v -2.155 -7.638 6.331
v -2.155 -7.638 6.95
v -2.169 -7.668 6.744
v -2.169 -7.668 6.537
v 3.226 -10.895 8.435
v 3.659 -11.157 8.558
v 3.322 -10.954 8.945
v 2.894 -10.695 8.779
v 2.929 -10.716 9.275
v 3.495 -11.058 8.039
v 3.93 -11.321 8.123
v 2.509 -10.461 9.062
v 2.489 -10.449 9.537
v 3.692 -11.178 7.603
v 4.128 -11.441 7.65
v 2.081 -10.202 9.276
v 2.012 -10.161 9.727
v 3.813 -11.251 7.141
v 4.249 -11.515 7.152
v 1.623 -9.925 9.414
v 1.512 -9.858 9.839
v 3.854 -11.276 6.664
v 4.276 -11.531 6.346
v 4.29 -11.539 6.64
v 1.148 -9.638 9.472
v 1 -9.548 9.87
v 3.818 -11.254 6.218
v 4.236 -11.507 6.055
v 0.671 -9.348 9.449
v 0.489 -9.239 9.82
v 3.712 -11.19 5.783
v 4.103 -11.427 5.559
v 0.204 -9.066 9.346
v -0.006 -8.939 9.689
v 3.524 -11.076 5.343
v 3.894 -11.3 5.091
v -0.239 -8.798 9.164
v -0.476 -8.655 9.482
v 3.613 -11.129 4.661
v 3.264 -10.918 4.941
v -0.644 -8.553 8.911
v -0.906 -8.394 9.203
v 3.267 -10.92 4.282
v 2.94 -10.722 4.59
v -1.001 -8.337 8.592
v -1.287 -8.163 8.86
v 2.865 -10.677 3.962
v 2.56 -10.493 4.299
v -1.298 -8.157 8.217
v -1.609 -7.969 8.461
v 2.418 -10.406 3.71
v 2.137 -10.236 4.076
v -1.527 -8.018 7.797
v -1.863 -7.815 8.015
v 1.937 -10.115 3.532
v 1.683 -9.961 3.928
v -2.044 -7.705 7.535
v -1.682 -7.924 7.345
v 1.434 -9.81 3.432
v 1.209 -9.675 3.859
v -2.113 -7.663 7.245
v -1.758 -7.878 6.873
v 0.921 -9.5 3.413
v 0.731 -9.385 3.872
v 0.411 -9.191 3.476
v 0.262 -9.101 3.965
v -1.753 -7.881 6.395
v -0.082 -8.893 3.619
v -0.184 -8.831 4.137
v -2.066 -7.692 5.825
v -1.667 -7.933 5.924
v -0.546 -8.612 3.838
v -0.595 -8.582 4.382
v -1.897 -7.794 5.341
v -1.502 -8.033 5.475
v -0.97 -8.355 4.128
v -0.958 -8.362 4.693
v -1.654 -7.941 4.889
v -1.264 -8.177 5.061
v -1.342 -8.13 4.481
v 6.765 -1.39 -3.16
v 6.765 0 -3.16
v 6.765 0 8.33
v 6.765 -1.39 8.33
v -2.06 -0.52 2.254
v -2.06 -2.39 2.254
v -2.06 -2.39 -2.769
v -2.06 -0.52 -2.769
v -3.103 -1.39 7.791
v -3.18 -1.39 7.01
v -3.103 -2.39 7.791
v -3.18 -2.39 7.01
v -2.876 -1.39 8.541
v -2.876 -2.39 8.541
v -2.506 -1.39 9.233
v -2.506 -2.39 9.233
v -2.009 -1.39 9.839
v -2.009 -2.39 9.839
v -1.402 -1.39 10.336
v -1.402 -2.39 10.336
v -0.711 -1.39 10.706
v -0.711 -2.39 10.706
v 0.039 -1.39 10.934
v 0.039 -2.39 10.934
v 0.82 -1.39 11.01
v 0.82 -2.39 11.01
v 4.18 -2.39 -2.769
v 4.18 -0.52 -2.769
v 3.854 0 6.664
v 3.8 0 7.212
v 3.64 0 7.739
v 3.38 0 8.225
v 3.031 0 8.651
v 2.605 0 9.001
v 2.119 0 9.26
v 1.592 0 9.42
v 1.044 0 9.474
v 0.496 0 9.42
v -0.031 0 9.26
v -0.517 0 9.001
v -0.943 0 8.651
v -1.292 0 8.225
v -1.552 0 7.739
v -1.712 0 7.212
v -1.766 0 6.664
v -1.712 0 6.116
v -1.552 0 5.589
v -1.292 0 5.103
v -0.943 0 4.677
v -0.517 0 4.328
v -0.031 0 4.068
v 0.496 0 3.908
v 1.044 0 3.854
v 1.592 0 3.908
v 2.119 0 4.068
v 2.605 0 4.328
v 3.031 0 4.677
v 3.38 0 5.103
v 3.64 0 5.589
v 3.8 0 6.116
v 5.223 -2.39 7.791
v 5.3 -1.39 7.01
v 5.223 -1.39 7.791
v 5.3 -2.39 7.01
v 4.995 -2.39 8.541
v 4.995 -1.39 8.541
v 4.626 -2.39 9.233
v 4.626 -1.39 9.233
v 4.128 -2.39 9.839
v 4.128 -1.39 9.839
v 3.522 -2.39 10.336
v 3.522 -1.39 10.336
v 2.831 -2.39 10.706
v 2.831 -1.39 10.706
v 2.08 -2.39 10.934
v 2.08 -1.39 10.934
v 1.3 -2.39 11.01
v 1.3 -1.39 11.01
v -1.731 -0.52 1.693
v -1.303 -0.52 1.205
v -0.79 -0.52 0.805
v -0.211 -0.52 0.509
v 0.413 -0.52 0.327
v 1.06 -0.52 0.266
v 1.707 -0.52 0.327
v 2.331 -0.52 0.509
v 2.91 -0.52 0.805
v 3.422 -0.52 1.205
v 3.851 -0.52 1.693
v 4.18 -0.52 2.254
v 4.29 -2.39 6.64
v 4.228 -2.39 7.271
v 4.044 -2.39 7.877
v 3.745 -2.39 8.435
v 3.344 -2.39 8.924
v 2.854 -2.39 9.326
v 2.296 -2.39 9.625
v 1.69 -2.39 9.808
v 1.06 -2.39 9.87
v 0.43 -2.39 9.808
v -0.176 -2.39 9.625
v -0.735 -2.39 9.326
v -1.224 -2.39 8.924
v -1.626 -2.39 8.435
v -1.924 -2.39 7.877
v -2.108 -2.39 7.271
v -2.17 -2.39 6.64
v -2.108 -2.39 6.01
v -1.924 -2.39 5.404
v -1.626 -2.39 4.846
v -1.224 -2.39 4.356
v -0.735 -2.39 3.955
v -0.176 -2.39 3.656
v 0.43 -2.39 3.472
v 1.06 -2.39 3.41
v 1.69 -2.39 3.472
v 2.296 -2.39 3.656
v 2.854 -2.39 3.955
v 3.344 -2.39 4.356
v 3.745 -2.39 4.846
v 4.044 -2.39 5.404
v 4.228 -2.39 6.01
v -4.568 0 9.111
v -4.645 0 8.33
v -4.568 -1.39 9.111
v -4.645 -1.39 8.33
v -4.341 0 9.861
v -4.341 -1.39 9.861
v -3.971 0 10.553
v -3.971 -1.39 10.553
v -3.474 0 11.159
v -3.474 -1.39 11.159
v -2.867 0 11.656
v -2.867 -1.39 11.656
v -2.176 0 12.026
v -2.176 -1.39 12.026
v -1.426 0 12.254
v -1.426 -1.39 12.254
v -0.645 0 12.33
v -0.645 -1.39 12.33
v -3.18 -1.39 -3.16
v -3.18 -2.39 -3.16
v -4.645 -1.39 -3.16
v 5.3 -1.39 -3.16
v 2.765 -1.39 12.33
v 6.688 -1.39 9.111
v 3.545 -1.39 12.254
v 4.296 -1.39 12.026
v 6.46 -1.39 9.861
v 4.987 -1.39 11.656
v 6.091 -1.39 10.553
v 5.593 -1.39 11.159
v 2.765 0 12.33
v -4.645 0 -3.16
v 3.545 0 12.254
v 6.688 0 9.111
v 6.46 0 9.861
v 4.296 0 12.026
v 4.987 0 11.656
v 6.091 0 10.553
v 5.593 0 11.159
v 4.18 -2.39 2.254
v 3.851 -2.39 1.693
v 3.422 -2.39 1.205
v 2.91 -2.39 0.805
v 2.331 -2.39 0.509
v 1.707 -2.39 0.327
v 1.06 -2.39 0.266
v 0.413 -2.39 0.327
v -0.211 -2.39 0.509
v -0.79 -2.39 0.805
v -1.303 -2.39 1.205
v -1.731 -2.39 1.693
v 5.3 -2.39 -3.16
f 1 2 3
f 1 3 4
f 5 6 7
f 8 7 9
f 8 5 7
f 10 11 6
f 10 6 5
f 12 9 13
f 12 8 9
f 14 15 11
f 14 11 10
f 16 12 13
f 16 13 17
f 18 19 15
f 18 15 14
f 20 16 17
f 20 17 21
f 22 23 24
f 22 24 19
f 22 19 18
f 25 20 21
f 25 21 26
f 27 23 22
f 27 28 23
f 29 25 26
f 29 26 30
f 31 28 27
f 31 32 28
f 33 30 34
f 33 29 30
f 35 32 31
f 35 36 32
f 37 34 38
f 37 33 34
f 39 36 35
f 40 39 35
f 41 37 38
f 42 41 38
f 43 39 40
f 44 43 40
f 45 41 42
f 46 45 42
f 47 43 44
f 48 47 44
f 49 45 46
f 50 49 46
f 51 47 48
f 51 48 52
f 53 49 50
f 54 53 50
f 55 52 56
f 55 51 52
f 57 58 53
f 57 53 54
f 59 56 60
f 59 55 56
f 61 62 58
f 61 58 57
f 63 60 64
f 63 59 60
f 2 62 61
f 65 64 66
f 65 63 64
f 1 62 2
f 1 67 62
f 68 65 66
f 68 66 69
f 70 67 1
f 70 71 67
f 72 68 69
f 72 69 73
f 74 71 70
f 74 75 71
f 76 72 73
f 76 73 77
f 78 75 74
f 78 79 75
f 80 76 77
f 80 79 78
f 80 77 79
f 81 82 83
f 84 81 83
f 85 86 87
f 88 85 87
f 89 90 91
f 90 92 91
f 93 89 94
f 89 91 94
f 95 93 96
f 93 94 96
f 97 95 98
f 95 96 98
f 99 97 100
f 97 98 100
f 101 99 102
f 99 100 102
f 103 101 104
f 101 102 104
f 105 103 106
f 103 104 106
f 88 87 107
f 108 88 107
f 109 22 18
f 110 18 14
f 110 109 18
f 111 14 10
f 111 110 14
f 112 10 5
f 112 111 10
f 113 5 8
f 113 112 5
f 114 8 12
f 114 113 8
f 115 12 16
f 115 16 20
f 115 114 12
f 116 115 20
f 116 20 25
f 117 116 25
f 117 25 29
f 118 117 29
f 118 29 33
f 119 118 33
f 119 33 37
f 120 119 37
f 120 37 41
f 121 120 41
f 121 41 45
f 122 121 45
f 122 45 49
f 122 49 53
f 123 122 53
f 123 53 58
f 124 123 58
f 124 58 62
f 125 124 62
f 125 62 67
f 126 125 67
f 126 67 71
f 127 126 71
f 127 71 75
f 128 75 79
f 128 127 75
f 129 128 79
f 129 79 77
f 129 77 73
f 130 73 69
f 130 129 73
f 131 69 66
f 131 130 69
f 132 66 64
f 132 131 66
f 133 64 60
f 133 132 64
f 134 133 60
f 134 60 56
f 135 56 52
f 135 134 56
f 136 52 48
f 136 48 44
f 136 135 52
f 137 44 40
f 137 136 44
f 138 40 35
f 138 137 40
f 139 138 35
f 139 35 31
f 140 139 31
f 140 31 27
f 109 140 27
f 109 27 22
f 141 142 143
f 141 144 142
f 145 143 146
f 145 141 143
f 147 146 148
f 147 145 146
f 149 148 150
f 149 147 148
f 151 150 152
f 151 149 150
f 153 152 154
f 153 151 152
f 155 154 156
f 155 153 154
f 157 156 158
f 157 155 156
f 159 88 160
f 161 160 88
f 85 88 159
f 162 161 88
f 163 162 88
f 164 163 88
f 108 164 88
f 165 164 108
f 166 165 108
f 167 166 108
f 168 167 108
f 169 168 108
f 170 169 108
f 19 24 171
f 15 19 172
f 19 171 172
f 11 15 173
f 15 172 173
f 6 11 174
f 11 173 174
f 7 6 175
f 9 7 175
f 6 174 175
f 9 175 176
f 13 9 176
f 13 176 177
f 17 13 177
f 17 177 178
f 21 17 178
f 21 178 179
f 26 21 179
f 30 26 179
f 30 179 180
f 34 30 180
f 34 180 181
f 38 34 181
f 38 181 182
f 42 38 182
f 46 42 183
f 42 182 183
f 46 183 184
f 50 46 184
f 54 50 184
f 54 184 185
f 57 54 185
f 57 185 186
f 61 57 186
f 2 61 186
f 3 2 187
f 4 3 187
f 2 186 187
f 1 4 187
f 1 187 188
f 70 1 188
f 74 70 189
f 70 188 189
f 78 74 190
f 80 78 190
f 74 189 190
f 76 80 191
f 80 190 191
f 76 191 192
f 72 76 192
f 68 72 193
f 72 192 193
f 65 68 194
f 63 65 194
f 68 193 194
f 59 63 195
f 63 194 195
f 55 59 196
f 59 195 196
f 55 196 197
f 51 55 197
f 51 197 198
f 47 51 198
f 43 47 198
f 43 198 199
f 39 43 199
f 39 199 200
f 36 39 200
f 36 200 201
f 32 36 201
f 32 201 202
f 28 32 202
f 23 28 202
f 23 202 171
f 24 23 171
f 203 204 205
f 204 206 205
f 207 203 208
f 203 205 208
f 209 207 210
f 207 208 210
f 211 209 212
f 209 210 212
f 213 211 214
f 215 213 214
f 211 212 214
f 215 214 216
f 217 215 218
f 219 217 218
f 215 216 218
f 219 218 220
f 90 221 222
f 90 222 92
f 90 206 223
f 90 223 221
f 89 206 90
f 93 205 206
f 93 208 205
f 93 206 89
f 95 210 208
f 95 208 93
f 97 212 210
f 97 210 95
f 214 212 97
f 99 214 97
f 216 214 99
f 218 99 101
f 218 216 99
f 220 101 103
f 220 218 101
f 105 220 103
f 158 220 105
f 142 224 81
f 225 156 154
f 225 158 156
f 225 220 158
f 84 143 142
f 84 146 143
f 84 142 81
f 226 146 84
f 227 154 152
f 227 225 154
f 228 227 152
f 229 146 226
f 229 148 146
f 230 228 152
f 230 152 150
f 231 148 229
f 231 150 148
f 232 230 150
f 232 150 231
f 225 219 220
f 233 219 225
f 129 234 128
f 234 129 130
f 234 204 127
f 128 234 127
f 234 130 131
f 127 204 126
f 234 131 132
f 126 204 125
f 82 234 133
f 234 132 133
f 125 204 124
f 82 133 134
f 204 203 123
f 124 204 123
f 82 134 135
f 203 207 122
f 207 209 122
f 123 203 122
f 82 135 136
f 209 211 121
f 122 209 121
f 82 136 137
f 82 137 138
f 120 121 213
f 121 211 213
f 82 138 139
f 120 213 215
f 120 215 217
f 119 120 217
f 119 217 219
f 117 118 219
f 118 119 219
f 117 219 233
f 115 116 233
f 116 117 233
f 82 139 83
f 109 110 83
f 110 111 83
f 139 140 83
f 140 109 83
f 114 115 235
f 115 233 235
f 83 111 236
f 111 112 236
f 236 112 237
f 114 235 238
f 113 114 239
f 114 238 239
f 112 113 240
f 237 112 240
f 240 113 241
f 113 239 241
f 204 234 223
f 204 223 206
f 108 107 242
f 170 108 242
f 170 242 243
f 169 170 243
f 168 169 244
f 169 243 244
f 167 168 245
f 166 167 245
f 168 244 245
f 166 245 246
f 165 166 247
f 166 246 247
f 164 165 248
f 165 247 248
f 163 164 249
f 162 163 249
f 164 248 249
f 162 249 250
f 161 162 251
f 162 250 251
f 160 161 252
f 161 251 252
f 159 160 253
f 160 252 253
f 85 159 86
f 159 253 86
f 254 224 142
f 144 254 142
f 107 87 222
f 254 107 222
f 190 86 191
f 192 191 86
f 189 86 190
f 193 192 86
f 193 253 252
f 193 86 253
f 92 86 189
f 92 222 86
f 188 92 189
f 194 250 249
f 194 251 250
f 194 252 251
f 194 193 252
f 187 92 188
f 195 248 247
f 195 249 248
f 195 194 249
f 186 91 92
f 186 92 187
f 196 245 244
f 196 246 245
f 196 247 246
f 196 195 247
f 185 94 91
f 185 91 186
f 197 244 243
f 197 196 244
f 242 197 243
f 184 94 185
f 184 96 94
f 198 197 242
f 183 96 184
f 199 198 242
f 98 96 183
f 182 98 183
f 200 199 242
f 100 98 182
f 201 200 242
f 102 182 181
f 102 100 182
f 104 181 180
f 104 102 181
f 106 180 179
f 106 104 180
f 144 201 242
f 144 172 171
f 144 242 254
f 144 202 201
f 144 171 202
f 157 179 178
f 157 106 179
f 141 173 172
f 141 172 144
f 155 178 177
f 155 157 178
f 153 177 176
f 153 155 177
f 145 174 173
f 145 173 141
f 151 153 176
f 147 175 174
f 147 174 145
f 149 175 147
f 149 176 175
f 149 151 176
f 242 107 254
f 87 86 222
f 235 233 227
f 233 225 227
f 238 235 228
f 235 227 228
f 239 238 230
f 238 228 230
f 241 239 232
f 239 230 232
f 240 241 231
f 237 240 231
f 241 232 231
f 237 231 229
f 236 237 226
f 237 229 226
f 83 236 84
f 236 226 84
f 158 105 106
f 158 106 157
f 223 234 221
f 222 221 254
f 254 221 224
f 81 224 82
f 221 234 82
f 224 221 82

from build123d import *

# Parameters (mm, degrees)
F0_W      = 11.41
F0_H      = 15.49
F1_DEPTH  = 1.39
F2_W      = 8.48
F2_H      = 14.17
F3_DEPTH  = 1
F4_R      = 3.23
F5_DEPTH  = 9.16
F6_R      = 4
F7_R      = 2.809954
F8_DEPTH  = 11.551
F10_DEPTH = 25
F12_DEPTH = 1.87


with BuildPart() as f1:
    # F0 (on Front) → F1 (new body)
    with BuildSketch(Plane.XZ):
        with Locations((1.059828, 4.585434)):
            Rectangle(F0_W, F0_H)
    extrude(amount=F1_DEPTH)

    # F2 (on face) → F3 (join)
    with BuildSketch(Plane.XZ.offset(1.39)):
        with Locations((1.059828, 3.925434)):
            Rectangle(F2_W, F2_H)
    extrude(amount=F3_DEPTH)

    # F4 (on face) → F5 (join)
    with BuildSketch(Plane.XZ.offset(2.39)):
        with Locations((1.059828, 6.640434)):
            Circle(F4_R)
    extrude(amount=F5_DEPTH)

    # F6
    f6_edges = [f1.edges().sort_by_distance(p)[0] for p in [
        (-4.645172, -0.695, 12.330434),
        (6.764828, -0.695, 12.330434),
        (5.299828, -1.89, 11.010434),
        (-3.180172, -1.89, 11.010434),
    ]]
    fillet(f6_edges, radius=F6_R)

    # F7 (on Front) → F8 (cut, through all)
    with BuildSketch(Plane.XZ):
        with Locations((1.043937, 6.664116)):
            Circle(F7_R)
    extrude(amount=F8_DEPTH, mode=Mode.SUBTRACT)

    # F9 (on Top) → F10 (cut)
    with BuildSketch(Plane.XY):
        Polygon((5.4795, -12.259658), (-2.155284, -7.637704), (-4.158131, -12.259658), align=None)
    extrude(amount=F10_DEPTH, mode=Mode.SUBTRACT)

    # F11 (on face) → F12 (cut)
    with BuildSketch(Plane.XZ.offset(2.39)):
        with BuildLine():
            ThreePointArc((4.179828, 2.253996), (1.059828, 0.2656), (-2.060172, 2.253996))
            Line((-2.060172, 2.253996), (-2.060172, -2.769004))
            Line((-2.060172, -2.769004), (4.179828, -2.769004))
            Line((4.179828, -2.769004), (4.179828, 2.253996))
        make_face()
    extrude(amount=-F12_DEPTH, mode=Mode.SUBTRACT)


solid = f1.part
